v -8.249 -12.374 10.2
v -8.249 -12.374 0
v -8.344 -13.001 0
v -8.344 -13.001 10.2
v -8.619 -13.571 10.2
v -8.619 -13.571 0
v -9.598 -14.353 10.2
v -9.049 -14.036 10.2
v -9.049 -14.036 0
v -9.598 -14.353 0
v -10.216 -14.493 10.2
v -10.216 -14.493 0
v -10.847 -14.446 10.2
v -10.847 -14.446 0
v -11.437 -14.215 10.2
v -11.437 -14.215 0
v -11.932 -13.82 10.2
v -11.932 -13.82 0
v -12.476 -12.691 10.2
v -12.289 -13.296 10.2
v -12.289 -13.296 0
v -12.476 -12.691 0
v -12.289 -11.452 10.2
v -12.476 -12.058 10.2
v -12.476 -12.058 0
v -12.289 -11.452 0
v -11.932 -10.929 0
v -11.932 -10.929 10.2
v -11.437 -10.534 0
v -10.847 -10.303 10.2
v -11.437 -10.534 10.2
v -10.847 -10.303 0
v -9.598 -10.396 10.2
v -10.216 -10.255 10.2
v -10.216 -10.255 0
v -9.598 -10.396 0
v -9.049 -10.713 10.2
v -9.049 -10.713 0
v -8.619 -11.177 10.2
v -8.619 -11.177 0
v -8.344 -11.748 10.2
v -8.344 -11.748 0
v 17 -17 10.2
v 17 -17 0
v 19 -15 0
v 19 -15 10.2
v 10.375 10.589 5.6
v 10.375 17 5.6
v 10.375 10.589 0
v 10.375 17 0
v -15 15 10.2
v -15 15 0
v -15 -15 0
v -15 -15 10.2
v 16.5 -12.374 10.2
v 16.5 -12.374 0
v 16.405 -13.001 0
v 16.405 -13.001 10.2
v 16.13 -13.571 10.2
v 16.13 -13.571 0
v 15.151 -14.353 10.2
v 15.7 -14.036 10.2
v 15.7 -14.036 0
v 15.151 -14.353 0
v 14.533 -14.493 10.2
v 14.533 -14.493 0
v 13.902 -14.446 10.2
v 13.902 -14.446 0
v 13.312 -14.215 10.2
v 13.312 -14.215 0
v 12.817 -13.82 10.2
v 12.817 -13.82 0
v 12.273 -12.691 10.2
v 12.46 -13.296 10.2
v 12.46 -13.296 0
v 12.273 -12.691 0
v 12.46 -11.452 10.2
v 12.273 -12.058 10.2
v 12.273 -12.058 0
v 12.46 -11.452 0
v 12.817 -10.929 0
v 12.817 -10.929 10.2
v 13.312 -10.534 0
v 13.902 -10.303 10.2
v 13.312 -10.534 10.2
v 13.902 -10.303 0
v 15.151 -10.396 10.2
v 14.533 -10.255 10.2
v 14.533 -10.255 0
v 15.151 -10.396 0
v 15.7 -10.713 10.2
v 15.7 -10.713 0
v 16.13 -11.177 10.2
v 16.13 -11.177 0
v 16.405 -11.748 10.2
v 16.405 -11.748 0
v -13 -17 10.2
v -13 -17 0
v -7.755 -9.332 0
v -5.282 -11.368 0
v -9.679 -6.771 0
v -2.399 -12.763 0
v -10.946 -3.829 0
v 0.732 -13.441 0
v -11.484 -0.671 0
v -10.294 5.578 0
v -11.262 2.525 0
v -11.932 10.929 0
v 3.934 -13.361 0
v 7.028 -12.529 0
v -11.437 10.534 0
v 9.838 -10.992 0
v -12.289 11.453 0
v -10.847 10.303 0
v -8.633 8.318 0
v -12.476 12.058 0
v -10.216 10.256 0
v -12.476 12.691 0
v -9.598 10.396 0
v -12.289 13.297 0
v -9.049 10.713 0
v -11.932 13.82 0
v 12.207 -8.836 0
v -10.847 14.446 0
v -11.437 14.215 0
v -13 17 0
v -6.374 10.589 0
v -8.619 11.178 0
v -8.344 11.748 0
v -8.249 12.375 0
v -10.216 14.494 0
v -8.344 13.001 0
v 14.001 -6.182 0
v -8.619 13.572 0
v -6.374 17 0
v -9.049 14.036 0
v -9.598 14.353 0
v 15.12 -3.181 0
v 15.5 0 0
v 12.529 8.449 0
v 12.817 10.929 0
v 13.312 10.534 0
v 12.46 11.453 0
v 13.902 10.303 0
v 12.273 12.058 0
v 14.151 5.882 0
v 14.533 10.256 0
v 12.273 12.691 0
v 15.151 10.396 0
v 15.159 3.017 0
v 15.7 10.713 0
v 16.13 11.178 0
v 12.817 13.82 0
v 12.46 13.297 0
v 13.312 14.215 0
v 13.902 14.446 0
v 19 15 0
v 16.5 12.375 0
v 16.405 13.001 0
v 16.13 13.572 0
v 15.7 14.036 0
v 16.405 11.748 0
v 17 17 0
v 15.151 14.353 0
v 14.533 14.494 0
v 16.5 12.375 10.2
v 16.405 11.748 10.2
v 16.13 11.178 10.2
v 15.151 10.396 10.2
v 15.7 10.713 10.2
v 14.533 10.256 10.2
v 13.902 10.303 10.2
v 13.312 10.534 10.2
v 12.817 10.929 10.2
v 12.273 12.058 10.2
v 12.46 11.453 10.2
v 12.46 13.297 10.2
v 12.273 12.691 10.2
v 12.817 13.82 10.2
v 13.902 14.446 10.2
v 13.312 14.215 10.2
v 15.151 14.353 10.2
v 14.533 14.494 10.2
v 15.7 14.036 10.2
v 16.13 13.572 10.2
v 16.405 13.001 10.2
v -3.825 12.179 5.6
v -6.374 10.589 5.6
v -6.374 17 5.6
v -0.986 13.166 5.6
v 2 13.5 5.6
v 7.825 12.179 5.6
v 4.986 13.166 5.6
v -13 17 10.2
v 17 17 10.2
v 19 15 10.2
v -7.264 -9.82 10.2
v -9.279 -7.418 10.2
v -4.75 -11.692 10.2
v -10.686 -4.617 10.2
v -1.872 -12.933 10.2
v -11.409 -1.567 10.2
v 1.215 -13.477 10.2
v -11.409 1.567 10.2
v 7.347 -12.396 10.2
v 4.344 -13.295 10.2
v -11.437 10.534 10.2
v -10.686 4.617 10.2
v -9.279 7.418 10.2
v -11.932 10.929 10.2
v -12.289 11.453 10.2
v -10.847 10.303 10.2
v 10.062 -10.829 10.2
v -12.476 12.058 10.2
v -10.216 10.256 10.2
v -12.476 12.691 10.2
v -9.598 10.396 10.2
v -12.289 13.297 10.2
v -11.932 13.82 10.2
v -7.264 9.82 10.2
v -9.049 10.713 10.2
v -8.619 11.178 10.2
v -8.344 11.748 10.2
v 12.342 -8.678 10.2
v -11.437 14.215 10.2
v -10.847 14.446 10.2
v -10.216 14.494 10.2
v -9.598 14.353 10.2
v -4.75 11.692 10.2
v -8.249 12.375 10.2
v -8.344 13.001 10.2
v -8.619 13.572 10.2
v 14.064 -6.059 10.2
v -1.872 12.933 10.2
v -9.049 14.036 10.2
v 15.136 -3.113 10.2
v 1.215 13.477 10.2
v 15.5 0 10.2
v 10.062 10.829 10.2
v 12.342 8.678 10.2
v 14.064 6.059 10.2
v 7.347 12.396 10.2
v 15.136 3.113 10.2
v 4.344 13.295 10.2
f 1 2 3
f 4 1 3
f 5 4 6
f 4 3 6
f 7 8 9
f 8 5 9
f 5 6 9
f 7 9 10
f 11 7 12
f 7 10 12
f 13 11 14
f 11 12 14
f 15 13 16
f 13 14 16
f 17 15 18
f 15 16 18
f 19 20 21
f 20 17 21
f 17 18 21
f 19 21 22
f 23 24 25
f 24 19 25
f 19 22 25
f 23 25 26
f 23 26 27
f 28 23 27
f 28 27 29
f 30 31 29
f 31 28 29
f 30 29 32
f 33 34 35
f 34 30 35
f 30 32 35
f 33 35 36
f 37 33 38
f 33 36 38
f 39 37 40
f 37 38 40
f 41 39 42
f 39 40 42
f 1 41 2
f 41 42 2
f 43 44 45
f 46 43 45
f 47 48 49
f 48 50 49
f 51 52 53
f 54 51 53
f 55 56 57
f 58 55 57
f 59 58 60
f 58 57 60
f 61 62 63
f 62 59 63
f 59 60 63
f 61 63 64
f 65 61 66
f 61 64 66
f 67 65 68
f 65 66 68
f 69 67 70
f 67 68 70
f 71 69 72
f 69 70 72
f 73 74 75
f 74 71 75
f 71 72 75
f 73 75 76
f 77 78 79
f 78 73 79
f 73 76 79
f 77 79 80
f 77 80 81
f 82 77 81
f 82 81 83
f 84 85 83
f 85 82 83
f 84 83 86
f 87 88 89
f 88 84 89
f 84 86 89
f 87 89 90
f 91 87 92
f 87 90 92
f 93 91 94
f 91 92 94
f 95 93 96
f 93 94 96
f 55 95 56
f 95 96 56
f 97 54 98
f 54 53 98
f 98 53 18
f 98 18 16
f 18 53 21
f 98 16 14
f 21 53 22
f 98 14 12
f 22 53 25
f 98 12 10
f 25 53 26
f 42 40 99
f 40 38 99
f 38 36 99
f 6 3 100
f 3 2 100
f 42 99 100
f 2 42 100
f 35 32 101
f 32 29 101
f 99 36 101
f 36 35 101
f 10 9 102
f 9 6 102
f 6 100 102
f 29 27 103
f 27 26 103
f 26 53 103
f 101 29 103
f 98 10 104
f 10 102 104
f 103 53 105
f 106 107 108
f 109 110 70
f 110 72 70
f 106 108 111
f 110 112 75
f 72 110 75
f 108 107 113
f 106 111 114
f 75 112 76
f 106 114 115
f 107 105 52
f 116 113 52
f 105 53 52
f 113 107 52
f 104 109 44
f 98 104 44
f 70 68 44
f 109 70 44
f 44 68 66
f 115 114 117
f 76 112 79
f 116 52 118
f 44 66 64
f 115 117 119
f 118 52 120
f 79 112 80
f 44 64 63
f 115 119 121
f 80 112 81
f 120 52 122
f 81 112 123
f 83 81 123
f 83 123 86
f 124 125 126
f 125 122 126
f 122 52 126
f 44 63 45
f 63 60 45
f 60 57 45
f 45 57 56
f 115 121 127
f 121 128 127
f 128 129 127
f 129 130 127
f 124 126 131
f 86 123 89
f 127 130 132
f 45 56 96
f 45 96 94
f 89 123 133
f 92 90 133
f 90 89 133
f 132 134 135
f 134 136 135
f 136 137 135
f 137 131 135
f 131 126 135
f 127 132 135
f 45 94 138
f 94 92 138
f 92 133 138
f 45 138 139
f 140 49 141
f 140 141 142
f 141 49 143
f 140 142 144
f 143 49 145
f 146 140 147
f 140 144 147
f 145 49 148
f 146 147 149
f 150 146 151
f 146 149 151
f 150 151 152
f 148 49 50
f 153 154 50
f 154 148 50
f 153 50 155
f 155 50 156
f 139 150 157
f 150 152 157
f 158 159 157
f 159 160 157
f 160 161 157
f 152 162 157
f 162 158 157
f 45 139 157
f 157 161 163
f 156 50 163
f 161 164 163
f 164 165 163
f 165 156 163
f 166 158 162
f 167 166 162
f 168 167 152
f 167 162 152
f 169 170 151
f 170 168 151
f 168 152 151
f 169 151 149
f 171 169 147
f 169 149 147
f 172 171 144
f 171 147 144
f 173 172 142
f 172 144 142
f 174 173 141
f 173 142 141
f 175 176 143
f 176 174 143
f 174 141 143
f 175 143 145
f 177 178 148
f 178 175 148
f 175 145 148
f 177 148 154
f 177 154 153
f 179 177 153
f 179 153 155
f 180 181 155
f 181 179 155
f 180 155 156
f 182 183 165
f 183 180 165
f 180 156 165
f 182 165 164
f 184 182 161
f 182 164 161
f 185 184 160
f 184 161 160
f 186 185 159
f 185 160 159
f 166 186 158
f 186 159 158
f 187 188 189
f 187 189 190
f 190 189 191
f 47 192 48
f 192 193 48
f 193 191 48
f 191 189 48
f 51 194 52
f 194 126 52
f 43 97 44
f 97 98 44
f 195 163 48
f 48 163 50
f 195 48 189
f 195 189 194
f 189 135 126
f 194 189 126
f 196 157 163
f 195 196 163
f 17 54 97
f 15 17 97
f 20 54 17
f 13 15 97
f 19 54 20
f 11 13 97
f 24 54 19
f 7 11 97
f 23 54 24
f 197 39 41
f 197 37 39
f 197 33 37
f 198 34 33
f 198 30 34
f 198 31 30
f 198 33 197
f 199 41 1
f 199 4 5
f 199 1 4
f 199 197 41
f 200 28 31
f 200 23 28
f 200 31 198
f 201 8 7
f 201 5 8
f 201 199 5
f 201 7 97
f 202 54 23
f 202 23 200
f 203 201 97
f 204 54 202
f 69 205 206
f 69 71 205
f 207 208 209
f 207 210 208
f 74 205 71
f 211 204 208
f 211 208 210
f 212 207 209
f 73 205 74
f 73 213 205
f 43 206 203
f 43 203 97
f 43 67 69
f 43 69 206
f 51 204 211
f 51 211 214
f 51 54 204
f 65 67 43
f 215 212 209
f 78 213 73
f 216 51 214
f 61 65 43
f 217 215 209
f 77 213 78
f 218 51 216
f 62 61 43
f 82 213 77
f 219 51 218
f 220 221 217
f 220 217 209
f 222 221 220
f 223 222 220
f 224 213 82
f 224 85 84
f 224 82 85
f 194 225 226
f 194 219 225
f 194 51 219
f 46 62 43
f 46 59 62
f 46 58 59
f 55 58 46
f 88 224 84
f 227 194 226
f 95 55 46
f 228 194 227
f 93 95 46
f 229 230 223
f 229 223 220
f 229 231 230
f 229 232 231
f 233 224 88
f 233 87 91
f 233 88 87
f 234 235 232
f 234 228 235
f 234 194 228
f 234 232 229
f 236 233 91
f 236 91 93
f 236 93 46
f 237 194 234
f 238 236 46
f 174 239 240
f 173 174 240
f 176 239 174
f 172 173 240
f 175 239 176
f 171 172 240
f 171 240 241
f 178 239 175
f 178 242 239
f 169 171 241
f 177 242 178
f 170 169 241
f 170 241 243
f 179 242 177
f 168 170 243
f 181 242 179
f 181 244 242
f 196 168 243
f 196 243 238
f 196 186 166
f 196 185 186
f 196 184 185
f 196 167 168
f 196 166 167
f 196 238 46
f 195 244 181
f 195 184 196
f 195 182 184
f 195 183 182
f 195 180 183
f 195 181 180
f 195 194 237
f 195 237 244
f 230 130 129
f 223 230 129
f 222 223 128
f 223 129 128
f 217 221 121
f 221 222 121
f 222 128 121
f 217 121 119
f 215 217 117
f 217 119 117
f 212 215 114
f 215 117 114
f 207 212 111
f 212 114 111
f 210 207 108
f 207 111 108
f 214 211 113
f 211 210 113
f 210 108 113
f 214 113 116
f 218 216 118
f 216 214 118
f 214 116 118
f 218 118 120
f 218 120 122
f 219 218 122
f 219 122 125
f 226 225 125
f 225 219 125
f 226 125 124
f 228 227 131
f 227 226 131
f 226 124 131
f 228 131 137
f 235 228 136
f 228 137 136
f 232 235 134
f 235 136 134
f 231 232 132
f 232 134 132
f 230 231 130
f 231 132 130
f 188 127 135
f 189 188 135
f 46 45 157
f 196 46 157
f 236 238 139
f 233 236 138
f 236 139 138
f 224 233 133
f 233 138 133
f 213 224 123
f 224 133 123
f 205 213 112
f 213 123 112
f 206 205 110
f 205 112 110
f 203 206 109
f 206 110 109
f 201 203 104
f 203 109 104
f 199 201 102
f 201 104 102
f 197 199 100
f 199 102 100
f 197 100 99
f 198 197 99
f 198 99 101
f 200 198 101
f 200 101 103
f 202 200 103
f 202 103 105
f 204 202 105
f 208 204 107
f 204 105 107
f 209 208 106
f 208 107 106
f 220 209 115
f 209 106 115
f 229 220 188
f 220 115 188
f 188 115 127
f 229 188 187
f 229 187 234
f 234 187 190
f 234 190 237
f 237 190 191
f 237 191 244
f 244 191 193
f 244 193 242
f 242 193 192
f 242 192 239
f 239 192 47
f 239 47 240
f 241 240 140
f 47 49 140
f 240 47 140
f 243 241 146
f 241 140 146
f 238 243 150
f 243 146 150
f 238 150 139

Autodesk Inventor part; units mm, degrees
ref_plane "YZ Plane" through (0, 0, 0) normal (1, 0, 0) x (0, 1, 0)
ref_plane "XZ Plane" through (0, 0, 0) normal (0, 1, 0) x (-1, 0, 0)
ref_plane "XY Plane" through (0, 0, 0) normal (0, 0, 1) x (1, 0, 0)
sketch "Base" plane through (0, 0, 0) normal (0, 0, 1) x (1, 0, 0)
  line L0 (19.0001, -14.9999) -> (19.0001, 15.0001) projected
  line L1 (19.0001, 15.0001) -> (17.0001, 17.0001) projected
  line L2 (17.0001, 17.0001) -> (-12.9999, 17.0001) projected
  line L3 (-12.9999, 17.0001) -> (-14.9999, 15.0001) projected
  line L4 (-14.9999, 15.0001) -> (-14.9999, -14.9999) projected
  line L5 (-14.9999, -14.9999) -> (-12.9999, -16.9999) projected
  line L6 (-12.9999, -16.9999) -> (17.0001, -16.9999) projected
  line L7 (17.0001, -16.9999) -> (19.0001, -14.9999) projected
  circle A0 centre (-10.3744, 12.3746) radius 1.75 construction
  circle A1 centre (-2.9999, 8.7501) radius 0.475 construction
  circle A2 centre (-0.4999, 8.7501) radius 0.475 construction
  circle A3 centre (2.0001, 8.7501) radius 0.475 construction
  circle A4 centre (4.5001, 8.7501) radius 0.475 construction
  circle A5 centre (7.0001, 8.7501) radius 0.475 construction
  circle A6 centre (14.3746, 12.3746) radius 1.75 construction
  circle A7 centre (-10.3744, -12.3744) radius 1.75 construction
  circle A8 centre (14.3746, -12.3744) radius 1.75 construction
  line L8 (-5.7099, 9.0001) -> (-5.7099, 16.0001) construction
  line L9 (9.7101, 9.0001) -> (9.7101, 16.0001) construction
  line L10 (-5.7099, 16.0001) -> (9.7101, 16.0001) construction
  circle A9 centre (2, 0) radius 2.5 construction
  circle A10 centre (-10.3744, 12.3746) radius 4 construction
  circle A11 centre (14.3746, 12.3746) radius 4 construction
  circle A12 centre (14.3746, -12.3744) radius 4 construction
  circle A13 centre (-10.3744, -12.3744) radius 4 construction
  line L11 (-6.3744, 12.3746) -> (-6.3744, 17.0001)
  line L12 (10.3746, 12.3746) -> (10.3746, 17.0001)
  circle A14 centre (2, 0) radius 13.5002
  line L13 (-21.7999, 0) -> (25.8001, 0) construction
  line L14 (-6.3744, 12.3746) -> (-6.3744, 10.5889)
  line L15 (10.3746, 12.3746) -> (10.3746, 10.5887)
  circle A15 centre (-10.3744, 12.3746) radius 2.125
  circle A16 centre (-10.3744, -12.3744) radius 2.125
  circle A17 centre (14.3746, -12.3744) radius 2.125
  circle A18 centre (14.3746, 12.3746) radius 2.125
  point P0 (0, 0)
  point P1 (-7.5221, -9.57)
  point P2 (-7.57, -9.5221)
  dimension "d8" = 8
  dimension "d13" = 3.5
  dimension "d14" = 4.25
extrude "BaseFeature" add sketch "Base" along normal blind 10.2 contours L7 L6 L5 L4 L3 L2 L11 L14 A14 L15 L12 L1 L0 | L12 L15 A14 L14 L11 L2
extrude "ConnectorHoleFeature" cut sketch "Base" along normal blind 5.6 contours L12 L15 A14 L14 L11 L2
properties part number "ArmEncoderSpacer"
